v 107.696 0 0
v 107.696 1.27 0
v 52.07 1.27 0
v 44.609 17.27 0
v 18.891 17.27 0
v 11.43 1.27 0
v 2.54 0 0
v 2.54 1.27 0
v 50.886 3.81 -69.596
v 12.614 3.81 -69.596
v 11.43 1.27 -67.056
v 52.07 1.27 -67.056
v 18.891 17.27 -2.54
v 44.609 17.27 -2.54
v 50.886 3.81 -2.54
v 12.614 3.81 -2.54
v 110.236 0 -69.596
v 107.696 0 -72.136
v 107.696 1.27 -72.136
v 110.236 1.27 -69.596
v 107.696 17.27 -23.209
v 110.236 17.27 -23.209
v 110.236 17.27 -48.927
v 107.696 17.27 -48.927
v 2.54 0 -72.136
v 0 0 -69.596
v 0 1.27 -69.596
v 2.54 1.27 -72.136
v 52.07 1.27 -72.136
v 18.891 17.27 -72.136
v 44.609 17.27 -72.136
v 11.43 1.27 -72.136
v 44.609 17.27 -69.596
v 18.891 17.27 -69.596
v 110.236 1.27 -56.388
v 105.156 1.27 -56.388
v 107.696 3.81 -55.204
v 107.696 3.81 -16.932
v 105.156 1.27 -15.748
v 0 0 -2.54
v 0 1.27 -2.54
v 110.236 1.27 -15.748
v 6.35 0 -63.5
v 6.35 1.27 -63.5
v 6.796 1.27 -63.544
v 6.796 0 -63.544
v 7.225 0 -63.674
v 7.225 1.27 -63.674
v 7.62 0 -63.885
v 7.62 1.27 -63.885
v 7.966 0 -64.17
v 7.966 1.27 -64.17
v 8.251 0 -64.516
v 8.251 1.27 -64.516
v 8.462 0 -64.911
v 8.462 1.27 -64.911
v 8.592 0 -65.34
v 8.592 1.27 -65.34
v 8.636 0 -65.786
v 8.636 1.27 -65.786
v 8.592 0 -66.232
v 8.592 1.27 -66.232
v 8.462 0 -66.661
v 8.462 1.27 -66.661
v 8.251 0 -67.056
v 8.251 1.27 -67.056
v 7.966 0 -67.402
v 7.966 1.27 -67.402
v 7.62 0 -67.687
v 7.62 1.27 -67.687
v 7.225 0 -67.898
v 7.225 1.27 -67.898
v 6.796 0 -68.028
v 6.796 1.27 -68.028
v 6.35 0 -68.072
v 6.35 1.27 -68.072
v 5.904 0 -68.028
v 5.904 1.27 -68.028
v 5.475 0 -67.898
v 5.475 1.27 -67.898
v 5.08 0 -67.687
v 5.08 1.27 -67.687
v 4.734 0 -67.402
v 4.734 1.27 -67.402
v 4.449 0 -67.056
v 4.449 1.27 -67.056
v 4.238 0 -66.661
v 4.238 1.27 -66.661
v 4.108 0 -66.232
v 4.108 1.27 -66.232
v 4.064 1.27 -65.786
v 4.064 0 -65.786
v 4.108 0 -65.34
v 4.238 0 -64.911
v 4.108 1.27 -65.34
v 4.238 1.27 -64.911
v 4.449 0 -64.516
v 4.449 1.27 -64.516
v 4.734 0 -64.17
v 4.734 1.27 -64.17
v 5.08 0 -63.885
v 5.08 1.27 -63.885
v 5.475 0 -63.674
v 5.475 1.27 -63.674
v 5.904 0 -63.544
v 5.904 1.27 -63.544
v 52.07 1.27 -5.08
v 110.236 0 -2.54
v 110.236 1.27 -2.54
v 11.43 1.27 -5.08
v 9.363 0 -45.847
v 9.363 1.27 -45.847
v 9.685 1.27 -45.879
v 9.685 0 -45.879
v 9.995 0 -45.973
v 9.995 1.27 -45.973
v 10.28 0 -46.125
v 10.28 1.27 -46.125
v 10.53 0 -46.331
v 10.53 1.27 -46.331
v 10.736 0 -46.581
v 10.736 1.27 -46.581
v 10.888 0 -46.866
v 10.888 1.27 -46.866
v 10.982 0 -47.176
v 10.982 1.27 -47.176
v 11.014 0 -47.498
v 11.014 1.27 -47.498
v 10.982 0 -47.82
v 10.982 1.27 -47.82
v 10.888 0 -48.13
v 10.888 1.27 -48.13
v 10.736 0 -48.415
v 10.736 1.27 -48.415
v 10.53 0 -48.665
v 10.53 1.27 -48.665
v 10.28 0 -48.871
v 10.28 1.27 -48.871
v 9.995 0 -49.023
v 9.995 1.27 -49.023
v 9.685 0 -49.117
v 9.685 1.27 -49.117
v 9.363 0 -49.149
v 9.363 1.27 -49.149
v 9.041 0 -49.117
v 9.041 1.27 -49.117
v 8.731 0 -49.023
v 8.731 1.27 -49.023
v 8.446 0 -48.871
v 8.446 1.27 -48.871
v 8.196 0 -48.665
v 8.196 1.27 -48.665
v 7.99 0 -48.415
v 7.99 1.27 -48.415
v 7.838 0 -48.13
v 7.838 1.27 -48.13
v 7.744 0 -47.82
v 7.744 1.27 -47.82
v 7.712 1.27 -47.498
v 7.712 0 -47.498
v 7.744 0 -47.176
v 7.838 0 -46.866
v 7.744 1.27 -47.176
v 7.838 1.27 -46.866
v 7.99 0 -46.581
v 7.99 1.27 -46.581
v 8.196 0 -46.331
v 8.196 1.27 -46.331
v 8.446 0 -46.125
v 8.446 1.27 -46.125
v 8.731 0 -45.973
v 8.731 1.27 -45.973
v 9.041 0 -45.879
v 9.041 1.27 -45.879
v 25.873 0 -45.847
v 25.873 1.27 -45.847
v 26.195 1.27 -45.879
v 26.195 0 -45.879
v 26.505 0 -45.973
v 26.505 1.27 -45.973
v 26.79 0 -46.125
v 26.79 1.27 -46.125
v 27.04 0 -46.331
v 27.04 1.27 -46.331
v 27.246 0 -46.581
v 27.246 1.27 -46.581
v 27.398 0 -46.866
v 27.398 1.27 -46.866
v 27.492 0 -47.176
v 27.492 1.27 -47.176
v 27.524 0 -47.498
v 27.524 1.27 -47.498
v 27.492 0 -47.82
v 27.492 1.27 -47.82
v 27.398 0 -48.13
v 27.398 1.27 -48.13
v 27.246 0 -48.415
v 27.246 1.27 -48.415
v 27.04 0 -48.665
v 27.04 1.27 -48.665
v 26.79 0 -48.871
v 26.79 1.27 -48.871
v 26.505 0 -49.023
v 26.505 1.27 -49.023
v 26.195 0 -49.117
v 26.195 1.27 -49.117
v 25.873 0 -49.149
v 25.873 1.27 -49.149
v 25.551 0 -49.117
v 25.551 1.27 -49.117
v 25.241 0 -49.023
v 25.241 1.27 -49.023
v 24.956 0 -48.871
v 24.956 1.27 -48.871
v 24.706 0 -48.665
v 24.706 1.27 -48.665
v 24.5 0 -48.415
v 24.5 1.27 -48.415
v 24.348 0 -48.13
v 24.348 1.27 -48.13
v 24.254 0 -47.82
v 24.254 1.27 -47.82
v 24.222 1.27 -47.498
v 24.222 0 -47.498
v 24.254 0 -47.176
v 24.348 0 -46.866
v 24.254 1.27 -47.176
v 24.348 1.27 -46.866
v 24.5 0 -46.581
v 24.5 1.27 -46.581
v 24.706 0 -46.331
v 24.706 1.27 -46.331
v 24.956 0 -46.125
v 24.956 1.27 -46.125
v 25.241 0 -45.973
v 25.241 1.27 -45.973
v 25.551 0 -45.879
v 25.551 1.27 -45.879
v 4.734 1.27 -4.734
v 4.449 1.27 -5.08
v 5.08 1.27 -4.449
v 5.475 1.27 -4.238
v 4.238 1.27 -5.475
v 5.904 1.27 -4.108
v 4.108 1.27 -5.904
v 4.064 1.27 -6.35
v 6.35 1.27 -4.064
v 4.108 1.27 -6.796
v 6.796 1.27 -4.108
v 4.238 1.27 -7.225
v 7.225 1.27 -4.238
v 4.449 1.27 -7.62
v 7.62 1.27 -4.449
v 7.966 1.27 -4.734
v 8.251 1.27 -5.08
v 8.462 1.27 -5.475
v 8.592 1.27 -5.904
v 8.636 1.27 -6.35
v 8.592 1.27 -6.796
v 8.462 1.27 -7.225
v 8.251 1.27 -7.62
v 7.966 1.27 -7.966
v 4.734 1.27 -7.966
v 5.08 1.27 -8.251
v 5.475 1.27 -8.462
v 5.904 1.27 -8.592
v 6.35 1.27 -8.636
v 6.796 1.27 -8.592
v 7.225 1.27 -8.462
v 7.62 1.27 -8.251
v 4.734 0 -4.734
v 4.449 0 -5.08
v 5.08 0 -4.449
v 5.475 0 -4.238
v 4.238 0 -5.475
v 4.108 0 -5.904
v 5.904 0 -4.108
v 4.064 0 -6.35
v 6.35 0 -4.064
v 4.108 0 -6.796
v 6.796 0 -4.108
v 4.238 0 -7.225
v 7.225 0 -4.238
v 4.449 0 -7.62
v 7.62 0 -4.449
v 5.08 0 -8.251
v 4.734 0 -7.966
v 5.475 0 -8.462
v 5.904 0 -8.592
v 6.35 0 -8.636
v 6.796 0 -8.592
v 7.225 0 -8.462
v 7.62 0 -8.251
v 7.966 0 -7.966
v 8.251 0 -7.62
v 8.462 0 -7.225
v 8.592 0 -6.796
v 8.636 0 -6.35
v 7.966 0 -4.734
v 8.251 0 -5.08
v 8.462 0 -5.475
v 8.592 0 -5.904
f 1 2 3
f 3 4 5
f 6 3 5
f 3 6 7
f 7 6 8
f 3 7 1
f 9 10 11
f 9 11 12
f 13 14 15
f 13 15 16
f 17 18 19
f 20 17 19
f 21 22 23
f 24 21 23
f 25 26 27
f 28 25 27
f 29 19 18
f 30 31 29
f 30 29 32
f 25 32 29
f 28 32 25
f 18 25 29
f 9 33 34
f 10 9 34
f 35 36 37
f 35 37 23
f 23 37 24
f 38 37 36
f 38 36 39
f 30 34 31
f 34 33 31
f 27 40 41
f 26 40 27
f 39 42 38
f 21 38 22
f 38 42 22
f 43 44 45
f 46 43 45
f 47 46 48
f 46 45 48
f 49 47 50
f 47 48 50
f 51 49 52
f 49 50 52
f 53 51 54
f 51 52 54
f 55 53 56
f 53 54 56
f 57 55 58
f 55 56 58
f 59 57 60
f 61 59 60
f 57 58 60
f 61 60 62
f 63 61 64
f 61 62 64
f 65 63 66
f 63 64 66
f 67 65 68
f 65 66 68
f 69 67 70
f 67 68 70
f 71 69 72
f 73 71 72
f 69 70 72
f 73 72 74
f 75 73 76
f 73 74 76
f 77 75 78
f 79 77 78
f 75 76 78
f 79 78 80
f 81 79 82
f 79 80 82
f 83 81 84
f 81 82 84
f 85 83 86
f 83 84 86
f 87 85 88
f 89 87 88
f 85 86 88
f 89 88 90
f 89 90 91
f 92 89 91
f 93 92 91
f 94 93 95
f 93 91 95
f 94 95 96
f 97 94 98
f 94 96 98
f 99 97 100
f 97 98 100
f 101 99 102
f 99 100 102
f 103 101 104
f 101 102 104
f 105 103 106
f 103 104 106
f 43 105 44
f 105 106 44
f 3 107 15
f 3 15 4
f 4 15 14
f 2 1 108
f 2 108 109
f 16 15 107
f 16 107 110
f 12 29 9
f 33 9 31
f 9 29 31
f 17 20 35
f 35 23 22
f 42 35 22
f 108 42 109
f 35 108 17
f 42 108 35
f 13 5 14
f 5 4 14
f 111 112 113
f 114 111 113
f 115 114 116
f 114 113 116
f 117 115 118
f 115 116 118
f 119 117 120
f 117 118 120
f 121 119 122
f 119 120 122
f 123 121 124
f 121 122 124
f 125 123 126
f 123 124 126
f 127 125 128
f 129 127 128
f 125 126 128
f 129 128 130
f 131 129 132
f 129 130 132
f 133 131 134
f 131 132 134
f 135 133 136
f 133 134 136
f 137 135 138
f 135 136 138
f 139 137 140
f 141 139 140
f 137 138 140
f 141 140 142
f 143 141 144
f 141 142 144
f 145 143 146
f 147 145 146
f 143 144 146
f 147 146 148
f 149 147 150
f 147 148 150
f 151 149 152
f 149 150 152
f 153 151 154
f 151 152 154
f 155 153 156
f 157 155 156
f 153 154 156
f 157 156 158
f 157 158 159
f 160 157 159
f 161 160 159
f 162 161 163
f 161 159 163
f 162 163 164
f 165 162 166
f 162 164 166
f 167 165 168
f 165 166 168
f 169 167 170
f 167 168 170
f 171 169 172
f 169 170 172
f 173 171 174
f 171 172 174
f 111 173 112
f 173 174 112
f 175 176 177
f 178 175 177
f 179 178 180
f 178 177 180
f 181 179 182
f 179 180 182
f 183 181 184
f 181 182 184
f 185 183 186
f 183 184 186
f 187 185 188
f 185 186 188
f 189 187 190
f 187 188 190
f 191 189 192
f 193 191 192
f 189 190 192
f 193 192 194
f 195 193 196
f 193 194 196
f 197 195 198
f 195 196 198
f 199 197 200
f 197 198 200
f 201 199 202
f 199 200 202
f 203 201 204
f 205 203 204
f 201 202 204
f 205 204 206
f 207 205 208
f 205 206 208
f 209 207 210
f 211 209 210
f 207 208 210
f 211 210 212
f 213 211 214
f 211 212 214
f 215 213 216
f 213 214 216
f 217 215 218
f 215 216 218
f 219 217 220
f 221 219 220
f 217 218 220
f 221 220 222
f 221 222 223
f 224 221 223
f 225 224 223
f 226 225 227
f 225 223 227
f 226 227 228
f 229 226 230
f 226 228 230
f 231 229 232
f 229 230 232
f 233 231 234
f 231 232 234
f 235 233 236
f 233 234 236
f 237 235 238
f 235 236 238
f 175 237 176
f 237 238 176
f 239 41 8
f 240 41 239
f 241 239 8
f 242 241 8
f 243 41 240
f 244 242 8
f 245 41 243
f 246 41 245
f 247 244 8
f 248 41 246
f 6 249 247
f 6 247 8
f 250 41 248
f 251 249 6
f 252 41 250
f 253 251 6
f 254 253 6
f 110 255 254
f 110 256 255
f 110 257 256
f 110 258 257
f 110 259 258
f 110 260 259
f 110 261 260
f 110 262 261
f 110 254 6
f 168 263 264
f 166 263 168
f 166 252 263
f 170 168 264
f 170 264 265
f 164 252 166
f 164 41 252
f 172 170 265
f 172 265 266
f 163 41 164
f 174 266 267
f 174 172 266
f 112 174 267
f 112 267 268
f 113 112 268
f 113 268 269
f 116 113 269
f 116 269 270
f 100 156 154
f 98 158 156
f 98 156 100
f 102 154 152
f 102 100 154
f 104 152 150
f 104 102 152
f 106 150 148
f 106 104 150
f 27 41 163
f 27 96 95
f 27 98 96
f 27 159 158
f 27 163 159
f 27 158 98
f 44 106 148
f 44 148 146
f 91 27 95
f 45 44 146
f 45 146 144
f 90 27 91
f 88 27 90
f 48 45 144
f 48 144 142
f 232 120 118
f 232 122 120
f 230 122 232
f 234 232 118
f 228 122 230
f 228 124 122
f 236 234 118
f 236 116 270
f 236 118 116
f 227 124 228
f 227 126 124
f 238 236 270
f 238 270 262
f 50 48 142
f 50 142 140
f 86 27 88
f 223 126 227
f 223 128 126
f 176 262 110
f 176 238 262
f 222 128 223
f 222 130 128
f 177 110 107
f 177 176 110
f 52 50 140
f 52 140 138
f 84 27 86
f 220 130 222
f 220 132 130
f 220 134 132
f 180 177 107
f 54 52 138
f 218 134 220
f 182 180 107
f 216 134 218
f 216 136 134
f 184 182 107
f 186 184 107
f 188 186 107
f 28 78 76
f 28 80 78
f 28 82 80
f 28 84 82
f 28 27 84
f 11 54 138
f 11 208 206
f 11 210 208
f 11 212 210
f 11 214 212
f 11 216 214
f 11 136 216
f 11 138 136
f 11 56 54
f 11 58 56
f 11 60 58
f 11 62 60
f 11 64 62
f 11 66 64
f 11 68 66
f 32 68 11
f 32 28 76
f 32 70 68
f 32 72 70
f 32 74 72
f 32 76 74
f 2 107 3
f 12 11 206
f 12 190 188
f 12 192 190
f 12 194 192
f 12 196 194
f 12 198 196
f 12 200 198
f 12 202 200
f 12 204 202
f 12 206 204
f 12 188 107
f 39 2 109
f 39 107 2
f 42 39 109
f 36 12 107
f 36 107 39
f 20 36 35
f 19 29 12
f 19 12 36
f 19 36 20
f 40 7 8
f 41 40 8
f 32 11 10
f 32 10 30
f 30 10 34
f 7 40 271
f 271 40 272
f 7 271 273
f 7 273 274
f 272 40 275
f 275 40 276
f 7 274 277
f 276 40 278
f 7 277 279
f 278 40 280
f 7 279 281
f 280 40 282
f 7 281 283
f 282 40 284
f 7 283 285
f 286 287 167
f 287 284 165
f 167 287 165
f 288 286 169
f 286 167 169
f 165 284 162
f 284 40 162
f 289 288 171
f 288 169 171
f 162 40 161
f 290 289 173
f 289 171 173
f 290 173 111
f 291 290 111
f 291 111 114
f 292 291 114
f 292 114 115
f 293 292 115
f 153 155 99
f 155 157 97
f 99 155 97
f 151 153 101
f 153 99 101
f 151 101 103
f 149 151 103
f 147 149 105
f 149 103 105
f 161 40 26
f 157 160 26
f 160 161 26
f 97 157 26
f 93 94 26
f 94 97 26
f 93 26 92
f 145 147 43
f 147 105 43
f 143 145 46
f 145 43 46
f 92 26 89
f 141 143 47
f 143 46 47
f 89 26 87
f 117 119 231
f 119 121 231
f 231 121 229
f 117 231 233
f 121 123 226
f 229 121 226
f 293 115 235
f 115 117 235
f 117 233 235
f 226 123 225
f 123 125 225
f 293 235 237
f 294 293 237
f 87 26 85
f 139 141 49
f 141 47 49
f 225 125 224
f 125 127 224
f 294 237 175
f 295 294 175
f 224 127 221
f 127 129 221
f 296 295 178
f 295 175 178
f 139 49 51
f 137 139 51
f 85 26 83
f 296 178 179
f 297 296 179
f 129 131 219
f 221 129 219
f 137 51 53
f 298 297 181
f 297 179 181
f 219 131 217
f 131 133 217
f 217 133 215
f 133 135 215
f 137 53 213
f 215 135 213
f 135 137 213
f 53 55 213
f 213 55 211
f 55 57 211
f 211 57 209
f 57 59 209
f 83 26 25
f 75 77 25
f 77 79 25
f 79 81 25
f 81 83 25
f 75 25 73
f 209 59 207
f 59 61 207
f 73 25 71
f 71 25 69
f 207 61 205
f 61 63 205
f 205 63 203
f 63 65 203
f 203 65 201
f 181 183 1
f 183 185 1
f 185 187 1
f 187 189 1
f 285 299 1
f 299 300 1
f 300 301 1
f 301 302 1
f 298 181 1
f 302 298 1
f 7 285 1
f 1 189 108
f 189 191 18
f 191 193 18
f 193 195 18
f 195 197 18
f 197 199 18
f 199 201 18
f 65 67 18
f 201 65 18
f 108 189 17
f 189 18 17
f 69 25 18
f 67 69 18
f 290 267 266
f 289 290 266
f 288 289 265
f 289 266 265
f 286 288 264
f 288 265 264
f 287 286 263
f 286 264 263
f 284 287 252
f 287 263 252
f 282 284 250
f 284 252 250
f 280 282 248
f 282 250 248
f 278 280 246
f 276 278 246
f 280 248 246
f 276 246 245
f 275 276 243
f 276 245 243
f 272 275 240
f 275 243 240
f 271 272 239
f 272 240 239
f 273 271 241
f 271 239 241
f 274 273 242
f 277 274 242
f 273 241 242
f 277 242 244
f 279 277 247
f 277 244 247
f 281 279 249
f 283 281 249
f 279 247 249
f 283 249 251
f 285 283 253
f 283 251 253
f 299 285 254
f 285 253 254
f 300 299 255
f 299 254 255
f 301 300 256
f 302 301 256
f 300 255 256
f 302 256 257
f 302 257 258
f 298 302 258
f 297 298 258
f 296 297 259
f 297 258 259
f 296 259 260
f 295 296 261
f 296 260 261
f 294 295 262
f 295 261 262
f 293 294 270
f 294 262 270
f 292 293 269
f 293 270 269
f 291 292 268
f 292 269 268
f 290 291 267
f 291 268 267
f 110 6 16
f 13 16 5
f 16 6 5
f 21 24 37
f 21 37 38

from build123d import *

# Parameters (mm, degrees)
SKETCH1_W           = 110.236
SKETCH1_H           = 72.136
BOSS_EXTRUDE1_DEPTH = 1.27
SKETCH2_R           = 2.286
SKETCH2_R_2         = 1.651
CUT_EXTRUDE1_DEPTH  = 1.27
SKETCH3_W           = 25.4
SKETCH3_H           = 2.54
SKETCH3_W_2         = 2.54
SKETCH3_H_2         = 25.4
BOSS_EXTRUDE2_DEPTH = 16
CHAMFER1_SIZE       = 7.62
CHAMFER1_SIZE_2     = 16.341142734
CHAMFER2_SIZE       = 2.54
CHAMFER3_SIZE       = 2.54


with BuildPart() as part:
    # Sketch1 → Boss-Extrude1 (new body)
    with BuildSketch(Plane(origin=(0, 0, 0), x_dir=(1, 0, 0), z_dir=(0, 1, 0))):
        with Locations((55.118, 36.068)):
            Rectangle(SKETCH1_W, SKETCH1_H)
    extrude(amount=BOSS_EXTRUDE1_DEPTH)

    # Sketch2 → Cut-Extrude1 (cut)
    with BuildSketch(Plane(origin=(0, 1.27, 0), x_dir=(1, 0, 0), z_dir=(0, 1, 0))):
        with Locations(Location((6.35, 65.786, 0), (0, 0, 270))):
            Circle(SKETCH2_R)
        with Locations(Location((9.363, 47.498, 0), (0, 0, 270))):
            Circle(SKETCH2_R_2)
        with Locations(Location((25.873, 47.498, 0), (0, 0, 270))):
            Circle(SKETCH2_R_2)
        with Locations(Location((6.35, 6.35, 0), (0, 0, 90))):
            Circle(SKETCH2_R)
    extrude(amount=-CUT_EXTRUDE1_DEPTH, mode=Mode.SUBTRACT)

    # Sketch3 → Boss-Extrude2 (add)
    with BuildSketch(Plane(origin=(0, 1.27, 0), x_dir=(1, 0, 0), z_dir=(0, 1, 0))):
        with Locations((31.75, 70.866)):
            Rectangle(SKETCH3_W, SKETCH3_H)
        with Locations((31.75, 1.27)):
            Rectangle(SKETCH3_W, SKETCH3_H)
        with Locations((108.966, 36.068)):
            Rectangle(SKETCH3_W_2, SKETCH3_H_2)
    extrude(amount=BOSS_EXTRUDE2_DEPTH)

    # Chamfer1
    # the kernel refuses this chamfer: 16.341142734, 7.62 mm, written as the material it adds along each edge
    with BuildSketch(Plane(origin=(44.45, 1.27, -2.54), x_dir=(0.9971975577536774, -0.07481330637060034, 0), z_dir=(0, 0, 1))) as chamfer1_piece_1_section:
        Polygon((CHAMFER1_SIZE * 0.997197557754, CHAMFER1_SIZE * 0.0748133063706), (-CHAMFER1_SIZE_2 * 0.0748133063719, CHAMFER1_SIZE_2 * 0.997197557771), (0, 0), align=None)
    chamfer1_piece_1 = extrude(amount=2.54, mode=Mode.PRIVATE)
    chamfer1_piece_1 = split(chamfer1_piece_1, bisect_by=Plane(origin=(46.87141812, 17.27, -1.27), z_dir=(0, -1, 0)), keep=Keep.TOP, mode=Mode.PRIVATE)
    add(chamfer1_piece_1)
    with BuildSketch(Plane(origin=(44.45, 1.27, -72.136), x_dir=(0.9971975577536774, -0.07481330637060034, 2.7895727589747506e-15), z_dir=(0, 0, 1))) as chamfer1_piece_2_section:
        Polygon((CHAMFER1_SIZE * 0.997197557754, CHAMFER1_SIZE * 0.0748133063706), (-CHAMFER1_SIZE_2 * 0.0748133063719, CHAMFER1_SIZE_2 * 0.997197557771), (0, 0), align=None)
    chamfer1_piece_2 = extrude(amount=2.54, mode=Mode.PRIVATE)
    chamfer1_piece_2 = split(chamfer1_piece_2, bisect_by=Plane(origin=(46.87141812, 17.27, -70.866), z_dir=(0, -1, 0)), keep=Keep.TOP, mode=Mode.PRIVATE)
    add(chamfer1_piece_2)
    with BuildSketch(Plane(origin=(19.05, 1.27, 0), x_dir=(-0.9971975577536774, -0.07481330637060028, 0), z_dir=(0, 0, -1))) as chamfer1_piece_3_section:
        Polygon((CHAMFER1_SIZE * 0.997197557754, CHAMFER1_SIZE * 0.0748133063706), (-CHAMFER1_SIZE_2 * 0.0748133063719, CHAMFER1_SIZE_2 * 0.997197557771), (0, 0), align=None)
    chamfer1_piece_3 = extrude(amount=2.54, mode=Mode.PRIVATE)
    chamfer1_piece_3 = split(chamfer1_piece_3, bisect_by=Plane(origin=(16.62858188, 17.27, -1.27), z_dir=(0, -1, 0)), keep=Keep.TOP, mode=Mode.PRIVATE)
    add(chamfer1_piece_3)
    with BuildSketch(Plane(origin=(19.05, 1.27, -69.596), x_dir=(-0.9971975577536774, -0.07481330637060032, 5.5791455179495004e-15), z_dir=(0, 0, -1))) as chamfer1_piece_4_section:
        Polygon((CHAMFER1_SIZE * 0.997197557754, CHAMFER1_SIZE * 0.0748133063706), (-CHAMFER1_SIZE_2 * 0.0748133063719, CHAMFER1_SIZE_2 * 0.997197557771), (0, 0), align=None)
    chamfer1_piece_4 = extrude(amount=2.54, mode=Mode.PRIVATE)
    chamfer1_piece_4 = split(chamfer1_piece_4, bisect_by=Plane(origin=(16.62858188, 17.27, -70.866), z_dir=(0, -1, 0)), keep=Keep.TOP, mode=Mode.PRIVATE)
    add(chamfer1_piece_4)
    with BuildSketch(Plane(origin=(107.696, 1.27, -48.768), x_dir=(0, -0.07481330637060034, -0.9971975577536774), z_dir=(1, 0, 0))) as chamfer1_piece_5_section:
        Polygon((CHAMFER1_SIZE * 0.997197557754, CHAMFER1_SIZE * 0.0748133063706), (-CHAMFER1_SIZE_2 * 0.0748133063719, CHAMFER1_SIZE_2 * 0.997197557771), (0, 0), align=None)
    chamfer1_piece_5 = extrude(amount=2.54, mode=Mode.PRIVATE)
    chamfer1_piece_5 = split(chamfer1_piece_5, bisect_by=Plane(origin=(108.966, 17.27, -51.18941812), z_dir=(0, -1, 0)), keep=Keep.TOP, mode=Mode.PRIVATE)
    add(chamfer1_piece_5)
    with BuildSketch(Plane(origin=(110.236, 1.27, -23.368), x_dir=(0, -0.07481330637060032, 0.9971975577536774), z_dir=(-1, 0, 0))) as chamfer1_piece_6_section:
        Polygon((CHAMFER1_SIZE * 0.997197557754, CHAMFER1_SIZE * 0.0748133063706), (-CHAMFER1_SIZE_2 * 0.0748133063719, CHAMFER1_SIZE_2 * 0.997197557771), (0, 0), align=None)
    chamfer1_piece_6 = extrude(amount=2.54, mode=Mode.PRIVATE)
    chamfer1_piece_6 = split(chamfer1_piece_6, bisect_by=Plane(origin=(108.966, 17.27, -20.94658188), z_dir=(0, -1, 0)), keep=Keep.TOP, mode=Mode.PRIVATE)
    add(chamfer1_piece_6)

    # Chamfer2
    chamfer2_edges = [part.edges().sort_by_distance(p)[0] for p in [
        (31.75, 1.27, -69.596),
        (31.75, 1.27, -2.54),
        (107.696, 1.27, -36.068),
    ]]
    chamfer(chamfer2_edges, length=CHAMFER2_SIZE)

    # Chamfer3
    chamfer3_edges = [part.edges().sort_by_distance(p)[0] for p in [
        (0, 0.635, -72.136),
        (110.236, 0.635, -72.136),
        (110.236, 0.635, 0),
        (0, 0.635, 0),
    ]]
    chamfer(chamfer3_edges, length=CHAMFER3_SIZE)


solid = part.part
